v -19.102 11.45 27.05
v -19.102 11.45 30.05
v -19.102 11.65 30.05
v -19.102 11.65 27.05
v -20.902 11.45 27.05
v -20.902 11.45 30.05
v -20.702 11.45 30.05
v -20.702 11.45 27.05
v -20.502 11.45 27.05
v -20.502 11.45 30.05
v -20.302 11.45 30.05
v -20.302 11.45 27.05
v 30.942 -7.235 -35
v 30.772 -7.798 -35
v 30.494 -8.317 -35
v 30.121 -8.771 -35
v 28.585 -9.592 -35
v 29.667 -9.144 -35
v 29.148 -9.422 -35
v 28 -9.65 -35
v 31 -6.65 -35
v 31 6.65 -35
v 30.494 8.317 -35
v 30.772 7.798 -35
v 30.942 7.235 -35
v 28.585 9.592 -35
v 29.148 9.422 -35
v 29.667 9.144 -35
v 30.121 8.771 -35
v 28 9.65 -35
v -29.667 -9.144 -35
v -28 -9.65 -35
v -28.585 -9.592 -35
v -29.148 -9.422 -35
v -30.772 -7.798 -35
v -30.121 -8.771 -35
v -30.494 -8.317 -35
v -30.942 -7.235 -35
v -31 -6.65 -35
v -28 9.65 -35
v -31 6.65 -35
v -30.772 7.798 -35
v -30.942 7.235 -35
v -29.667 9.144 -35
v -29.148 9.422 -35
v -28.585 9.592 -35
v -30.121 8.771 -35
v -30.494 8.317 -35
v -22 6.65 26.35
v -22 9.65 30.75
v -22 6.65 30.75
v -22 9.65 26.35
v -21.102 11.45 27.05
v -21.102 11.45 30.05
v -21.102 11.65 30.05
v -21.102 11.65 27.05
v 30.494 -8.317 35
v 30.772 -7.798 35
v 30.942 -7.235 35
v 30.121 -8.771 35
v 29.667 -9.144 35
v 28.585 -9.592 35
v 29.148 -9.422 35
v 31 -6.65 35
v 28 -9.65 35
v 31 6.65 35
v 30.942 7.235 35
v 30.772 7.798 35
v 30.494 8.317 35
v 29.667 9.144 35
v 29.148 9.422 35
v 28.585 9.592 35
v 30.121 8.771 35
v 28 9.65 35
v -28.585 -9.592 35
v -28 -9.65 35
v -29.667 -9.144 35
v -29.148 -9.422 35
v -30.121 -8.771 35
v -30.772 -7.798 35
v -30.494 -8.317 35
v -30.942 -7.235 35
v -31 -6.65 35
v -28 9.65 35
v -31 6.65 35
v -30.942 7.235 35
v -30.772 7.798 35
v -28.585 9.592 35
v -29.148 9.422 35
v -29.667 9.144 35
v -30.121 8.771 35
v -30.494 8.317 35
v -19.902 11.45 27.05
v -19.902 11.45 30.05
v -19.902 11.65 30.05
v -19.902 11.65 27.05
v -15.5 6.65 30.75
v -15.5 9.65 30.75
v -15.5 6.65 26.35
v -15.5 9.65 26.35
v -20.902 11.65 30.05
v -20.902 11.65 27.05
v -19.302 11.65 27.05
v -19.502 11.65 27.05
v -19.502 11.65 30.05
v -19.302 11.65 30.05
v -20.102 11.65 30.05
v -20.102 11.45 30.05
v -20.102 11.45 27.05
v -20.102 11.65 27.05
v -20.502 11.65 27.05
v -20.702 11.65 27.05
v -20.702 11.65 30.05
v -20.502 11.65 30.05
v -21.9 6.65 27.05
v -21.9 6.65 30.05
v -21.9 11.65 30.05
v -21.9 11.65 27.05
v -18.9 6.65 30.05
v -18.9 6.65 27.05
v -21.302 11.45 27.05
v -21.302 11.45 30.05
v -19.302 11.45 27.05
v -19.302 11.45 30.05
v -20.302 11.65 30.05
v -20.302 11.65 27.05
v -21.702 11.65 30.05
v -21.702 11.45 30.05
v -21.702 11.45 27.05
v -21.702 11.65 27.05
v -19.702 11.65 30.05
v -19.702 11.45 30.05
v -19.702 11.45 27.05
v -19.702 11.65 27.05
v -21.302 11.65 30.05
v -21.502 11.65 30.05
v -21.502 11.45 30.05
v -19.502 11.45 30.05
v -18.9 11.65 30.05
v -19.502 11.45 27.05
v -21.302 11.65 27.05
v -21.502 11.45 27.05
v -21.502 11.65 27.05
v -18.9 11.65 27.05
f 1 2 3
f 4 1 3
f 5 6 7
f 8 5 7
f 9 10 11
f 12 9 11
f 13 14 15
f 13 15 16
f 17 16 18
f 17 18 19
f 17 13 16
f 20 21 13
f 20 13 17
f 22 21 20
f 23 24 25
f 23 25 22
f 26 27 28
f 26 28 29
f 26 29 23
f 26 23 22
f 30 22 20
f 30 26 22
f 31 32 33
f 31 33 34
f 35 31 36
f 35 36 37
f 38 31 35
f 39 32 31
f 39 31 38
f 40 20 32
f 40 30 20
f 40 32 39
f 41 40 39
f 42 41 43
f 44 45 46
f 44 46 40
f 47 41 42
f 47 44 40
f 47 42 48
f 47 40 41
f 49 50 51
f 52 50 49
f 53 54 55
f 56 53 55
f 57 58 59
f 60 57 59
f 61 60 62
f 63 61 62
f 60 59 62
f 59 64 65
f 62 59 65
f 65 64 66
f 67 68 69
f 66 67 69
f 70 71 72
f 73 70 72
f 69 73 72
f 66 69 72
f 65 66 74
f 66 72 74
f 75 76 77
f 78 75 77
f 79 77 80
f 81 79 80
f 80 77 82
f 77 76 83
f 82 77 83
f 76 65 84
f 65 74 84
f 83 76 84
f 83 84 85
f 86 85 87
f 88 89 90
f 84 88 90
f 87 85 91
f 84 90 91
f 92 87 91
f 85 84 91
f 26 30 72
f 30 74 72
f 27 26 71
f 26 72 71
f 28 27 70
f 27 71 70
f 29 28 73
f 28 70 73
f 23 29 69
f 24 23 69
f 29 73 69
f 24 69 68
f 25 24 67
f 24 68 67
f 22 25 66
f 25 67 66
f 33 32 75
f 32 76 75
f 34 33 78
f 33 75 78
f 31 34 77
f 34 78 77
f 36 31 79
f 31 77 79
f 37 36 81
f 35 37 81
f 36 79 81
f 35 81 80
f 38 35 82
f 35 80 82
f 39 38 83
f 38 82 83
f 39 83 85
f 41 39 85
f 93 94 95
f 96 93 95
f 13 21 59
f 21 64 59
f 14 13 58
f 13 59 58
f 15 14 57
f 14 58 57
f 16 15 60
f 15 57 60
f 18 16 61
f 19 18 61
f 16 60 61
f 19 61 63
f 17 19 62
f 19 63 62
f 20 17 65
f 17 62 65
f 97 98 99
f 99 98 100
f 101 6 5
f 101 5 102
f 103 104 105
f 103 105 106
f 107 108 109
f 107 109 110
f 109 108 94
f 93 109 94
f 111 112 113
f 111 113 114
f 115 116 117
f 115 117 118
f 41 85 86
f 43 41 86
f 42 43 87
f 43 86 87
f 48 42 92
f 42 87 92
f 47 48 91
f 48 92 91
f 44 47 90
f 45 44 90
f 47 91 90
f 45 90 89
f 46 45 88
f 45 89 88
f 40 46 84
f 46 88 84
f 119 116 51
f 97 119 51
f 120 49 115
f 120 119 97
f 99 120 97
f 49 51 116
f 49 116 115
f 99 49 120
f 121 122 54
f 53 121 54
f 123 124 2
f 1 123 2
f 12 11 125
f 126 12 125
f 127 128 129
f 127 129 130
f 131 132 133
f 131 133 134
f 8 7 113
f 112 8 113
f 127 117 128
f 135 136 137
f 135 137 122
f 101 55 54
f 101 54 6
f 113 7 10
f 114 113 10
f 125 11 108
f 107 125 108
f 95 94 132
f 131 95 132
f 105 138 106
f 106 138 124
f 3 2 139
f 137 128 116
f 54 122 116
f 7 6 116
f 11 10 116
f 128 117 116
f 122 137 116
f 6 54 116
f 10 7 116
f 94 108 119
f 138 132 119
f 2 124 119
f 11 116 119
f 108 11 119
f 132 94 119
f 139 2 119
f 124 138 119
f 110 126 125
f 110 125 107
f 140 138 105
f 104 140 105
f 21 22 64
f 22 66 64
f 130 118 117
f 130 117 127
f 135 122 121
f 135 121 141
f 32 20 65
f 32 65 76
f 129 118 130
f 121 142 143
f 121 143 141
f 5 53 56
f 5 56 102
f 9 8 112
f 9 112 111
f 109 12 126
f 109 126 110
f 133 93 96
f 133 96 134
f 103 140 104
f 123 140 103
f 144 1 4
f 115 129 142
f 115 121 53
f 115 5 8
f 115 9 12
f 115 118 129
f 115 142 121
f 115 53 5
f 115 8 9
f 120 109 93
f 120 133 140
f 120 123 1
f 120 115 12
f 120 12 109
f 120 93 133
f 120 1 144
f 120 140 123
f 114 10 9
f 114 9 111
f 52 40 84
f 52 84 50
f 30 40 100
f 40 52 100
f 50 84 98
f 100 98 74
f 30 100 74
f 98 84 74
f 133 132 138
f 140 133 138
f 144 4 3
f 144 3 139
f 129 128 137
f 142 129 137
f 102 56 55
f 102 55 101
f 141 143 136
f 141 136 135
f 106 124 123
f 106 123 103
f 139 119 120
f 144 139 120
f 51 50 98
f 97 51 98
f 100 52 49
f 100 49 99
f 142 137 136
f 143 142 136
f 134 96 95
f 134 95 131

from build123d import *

# Parameters (mm, degrees)
BOSS_EXTRUDE1_DEPTH = 35
SKETCH2_W           = 6.5
SKETCH2_H           = 4.4
CUT_EXTRUDE1_DEPTH  = 3
SKETCH3_W           = 3
SKETCH3_H           = 3
BOSS_EXTRUDE2_DEPTH = 5
SKETCH4_W           = 0.2
SKETCH4_H           = 0.2
CUT_EXTRUDE2_DEPTH  = 73.994691588


with BuildPart() as part:
    # Sketch1 → Boss-Extrude1 (new, symmetric)
    with BuildSketch(Plane.XY):
        with BuildLine():
            Line((-28, 9.65), (28, 9.65))
            ThreePointArc((28, 9.65), (30.121320344, 8.771320344), (31, 6.65))
            Line((31, 6.65), (31, -6.65))
            ThreePointArc((31, -6.65), (30.121320344, -8.771320344), (28, -9.65))
            Line((28, -9.65), (-28, -9.65))
            ThreePointArc((-28, -9.65), (-30.121320344, -8.771320344), (-31, -6.65))
            Line((-31, -6.65), (-31, 6.65))
            ThreePointArc((-31, 6.65), (-30.121320344, 8.771320344), (-28, 9.65))
        make_face()
    extrude(amount=BOSS_EXTRUDE1_DEPTH, both=True)

    # Sketch2 → Cut-Extrude1 (cut)
    with BuildSketch(Plane(origin=(0, 9.65, 0), x_dir=(1, 0, 0), z_dir=(0, 1, 0))):
        with Locations((-18.75, -28.55)):
            Rectangle(SKETCH2_W, SKETCH2_H)
    extrude(amount=-CUT_EXTRUDE1_DEPTH, mode=Mode.SUBTRACT)

    # Sketch3 → Boss-Extrude2 (add)
    with BuildSketch(Plane(origin=(0, 6.65, 0), x_dir=(1, 0, 0), z_dir=(0, 1, 0))):
        with Locations((-20.4, -28.55)):
            Rectangle(SKETCH3_W, SKETCH3_H)
    extrude(amount=BOSS_EXTRUDE2_DEPTH)

    # Sketch4 → Cut-Extrude2 (cut, through all)
    with BuildSketch(Plane.XY.offset(30.05)):
        with Locations((-21.602270094, 11.55)):
            Rectangle(SKETCH4_W, SKETCH4_H)
        with Locations((-21.202270094, 11.55)):
            Rectangle(SKETCH4_W, SKETCH4_H)
        with Locations((-20.802270094, 11.55)):
            Rectangle(SKETCH4_W, SKETCH4_H)
        with Locations((-20.402270094, 11.55)):
            Rectangle(SKETCH4_W, SKETCH4_H)
        with Locations((-20.002270094, 11.55)):
            Rectangle(SKETCH4_W, SKETCH4_H)
        with Locations((-19.602270094, 11.55)):
            Rectangle(SKETCH4_W, SKETCH4_H)
        with Locations((-19.202270094, 11.55)):
            Rectangle(SKETCH4_W, SKETCH4_H)
    extrude(amount=-CUT_EXTRUDE2_DEPTH, mode=Mode.SUBTRACT)


solid = part.part
